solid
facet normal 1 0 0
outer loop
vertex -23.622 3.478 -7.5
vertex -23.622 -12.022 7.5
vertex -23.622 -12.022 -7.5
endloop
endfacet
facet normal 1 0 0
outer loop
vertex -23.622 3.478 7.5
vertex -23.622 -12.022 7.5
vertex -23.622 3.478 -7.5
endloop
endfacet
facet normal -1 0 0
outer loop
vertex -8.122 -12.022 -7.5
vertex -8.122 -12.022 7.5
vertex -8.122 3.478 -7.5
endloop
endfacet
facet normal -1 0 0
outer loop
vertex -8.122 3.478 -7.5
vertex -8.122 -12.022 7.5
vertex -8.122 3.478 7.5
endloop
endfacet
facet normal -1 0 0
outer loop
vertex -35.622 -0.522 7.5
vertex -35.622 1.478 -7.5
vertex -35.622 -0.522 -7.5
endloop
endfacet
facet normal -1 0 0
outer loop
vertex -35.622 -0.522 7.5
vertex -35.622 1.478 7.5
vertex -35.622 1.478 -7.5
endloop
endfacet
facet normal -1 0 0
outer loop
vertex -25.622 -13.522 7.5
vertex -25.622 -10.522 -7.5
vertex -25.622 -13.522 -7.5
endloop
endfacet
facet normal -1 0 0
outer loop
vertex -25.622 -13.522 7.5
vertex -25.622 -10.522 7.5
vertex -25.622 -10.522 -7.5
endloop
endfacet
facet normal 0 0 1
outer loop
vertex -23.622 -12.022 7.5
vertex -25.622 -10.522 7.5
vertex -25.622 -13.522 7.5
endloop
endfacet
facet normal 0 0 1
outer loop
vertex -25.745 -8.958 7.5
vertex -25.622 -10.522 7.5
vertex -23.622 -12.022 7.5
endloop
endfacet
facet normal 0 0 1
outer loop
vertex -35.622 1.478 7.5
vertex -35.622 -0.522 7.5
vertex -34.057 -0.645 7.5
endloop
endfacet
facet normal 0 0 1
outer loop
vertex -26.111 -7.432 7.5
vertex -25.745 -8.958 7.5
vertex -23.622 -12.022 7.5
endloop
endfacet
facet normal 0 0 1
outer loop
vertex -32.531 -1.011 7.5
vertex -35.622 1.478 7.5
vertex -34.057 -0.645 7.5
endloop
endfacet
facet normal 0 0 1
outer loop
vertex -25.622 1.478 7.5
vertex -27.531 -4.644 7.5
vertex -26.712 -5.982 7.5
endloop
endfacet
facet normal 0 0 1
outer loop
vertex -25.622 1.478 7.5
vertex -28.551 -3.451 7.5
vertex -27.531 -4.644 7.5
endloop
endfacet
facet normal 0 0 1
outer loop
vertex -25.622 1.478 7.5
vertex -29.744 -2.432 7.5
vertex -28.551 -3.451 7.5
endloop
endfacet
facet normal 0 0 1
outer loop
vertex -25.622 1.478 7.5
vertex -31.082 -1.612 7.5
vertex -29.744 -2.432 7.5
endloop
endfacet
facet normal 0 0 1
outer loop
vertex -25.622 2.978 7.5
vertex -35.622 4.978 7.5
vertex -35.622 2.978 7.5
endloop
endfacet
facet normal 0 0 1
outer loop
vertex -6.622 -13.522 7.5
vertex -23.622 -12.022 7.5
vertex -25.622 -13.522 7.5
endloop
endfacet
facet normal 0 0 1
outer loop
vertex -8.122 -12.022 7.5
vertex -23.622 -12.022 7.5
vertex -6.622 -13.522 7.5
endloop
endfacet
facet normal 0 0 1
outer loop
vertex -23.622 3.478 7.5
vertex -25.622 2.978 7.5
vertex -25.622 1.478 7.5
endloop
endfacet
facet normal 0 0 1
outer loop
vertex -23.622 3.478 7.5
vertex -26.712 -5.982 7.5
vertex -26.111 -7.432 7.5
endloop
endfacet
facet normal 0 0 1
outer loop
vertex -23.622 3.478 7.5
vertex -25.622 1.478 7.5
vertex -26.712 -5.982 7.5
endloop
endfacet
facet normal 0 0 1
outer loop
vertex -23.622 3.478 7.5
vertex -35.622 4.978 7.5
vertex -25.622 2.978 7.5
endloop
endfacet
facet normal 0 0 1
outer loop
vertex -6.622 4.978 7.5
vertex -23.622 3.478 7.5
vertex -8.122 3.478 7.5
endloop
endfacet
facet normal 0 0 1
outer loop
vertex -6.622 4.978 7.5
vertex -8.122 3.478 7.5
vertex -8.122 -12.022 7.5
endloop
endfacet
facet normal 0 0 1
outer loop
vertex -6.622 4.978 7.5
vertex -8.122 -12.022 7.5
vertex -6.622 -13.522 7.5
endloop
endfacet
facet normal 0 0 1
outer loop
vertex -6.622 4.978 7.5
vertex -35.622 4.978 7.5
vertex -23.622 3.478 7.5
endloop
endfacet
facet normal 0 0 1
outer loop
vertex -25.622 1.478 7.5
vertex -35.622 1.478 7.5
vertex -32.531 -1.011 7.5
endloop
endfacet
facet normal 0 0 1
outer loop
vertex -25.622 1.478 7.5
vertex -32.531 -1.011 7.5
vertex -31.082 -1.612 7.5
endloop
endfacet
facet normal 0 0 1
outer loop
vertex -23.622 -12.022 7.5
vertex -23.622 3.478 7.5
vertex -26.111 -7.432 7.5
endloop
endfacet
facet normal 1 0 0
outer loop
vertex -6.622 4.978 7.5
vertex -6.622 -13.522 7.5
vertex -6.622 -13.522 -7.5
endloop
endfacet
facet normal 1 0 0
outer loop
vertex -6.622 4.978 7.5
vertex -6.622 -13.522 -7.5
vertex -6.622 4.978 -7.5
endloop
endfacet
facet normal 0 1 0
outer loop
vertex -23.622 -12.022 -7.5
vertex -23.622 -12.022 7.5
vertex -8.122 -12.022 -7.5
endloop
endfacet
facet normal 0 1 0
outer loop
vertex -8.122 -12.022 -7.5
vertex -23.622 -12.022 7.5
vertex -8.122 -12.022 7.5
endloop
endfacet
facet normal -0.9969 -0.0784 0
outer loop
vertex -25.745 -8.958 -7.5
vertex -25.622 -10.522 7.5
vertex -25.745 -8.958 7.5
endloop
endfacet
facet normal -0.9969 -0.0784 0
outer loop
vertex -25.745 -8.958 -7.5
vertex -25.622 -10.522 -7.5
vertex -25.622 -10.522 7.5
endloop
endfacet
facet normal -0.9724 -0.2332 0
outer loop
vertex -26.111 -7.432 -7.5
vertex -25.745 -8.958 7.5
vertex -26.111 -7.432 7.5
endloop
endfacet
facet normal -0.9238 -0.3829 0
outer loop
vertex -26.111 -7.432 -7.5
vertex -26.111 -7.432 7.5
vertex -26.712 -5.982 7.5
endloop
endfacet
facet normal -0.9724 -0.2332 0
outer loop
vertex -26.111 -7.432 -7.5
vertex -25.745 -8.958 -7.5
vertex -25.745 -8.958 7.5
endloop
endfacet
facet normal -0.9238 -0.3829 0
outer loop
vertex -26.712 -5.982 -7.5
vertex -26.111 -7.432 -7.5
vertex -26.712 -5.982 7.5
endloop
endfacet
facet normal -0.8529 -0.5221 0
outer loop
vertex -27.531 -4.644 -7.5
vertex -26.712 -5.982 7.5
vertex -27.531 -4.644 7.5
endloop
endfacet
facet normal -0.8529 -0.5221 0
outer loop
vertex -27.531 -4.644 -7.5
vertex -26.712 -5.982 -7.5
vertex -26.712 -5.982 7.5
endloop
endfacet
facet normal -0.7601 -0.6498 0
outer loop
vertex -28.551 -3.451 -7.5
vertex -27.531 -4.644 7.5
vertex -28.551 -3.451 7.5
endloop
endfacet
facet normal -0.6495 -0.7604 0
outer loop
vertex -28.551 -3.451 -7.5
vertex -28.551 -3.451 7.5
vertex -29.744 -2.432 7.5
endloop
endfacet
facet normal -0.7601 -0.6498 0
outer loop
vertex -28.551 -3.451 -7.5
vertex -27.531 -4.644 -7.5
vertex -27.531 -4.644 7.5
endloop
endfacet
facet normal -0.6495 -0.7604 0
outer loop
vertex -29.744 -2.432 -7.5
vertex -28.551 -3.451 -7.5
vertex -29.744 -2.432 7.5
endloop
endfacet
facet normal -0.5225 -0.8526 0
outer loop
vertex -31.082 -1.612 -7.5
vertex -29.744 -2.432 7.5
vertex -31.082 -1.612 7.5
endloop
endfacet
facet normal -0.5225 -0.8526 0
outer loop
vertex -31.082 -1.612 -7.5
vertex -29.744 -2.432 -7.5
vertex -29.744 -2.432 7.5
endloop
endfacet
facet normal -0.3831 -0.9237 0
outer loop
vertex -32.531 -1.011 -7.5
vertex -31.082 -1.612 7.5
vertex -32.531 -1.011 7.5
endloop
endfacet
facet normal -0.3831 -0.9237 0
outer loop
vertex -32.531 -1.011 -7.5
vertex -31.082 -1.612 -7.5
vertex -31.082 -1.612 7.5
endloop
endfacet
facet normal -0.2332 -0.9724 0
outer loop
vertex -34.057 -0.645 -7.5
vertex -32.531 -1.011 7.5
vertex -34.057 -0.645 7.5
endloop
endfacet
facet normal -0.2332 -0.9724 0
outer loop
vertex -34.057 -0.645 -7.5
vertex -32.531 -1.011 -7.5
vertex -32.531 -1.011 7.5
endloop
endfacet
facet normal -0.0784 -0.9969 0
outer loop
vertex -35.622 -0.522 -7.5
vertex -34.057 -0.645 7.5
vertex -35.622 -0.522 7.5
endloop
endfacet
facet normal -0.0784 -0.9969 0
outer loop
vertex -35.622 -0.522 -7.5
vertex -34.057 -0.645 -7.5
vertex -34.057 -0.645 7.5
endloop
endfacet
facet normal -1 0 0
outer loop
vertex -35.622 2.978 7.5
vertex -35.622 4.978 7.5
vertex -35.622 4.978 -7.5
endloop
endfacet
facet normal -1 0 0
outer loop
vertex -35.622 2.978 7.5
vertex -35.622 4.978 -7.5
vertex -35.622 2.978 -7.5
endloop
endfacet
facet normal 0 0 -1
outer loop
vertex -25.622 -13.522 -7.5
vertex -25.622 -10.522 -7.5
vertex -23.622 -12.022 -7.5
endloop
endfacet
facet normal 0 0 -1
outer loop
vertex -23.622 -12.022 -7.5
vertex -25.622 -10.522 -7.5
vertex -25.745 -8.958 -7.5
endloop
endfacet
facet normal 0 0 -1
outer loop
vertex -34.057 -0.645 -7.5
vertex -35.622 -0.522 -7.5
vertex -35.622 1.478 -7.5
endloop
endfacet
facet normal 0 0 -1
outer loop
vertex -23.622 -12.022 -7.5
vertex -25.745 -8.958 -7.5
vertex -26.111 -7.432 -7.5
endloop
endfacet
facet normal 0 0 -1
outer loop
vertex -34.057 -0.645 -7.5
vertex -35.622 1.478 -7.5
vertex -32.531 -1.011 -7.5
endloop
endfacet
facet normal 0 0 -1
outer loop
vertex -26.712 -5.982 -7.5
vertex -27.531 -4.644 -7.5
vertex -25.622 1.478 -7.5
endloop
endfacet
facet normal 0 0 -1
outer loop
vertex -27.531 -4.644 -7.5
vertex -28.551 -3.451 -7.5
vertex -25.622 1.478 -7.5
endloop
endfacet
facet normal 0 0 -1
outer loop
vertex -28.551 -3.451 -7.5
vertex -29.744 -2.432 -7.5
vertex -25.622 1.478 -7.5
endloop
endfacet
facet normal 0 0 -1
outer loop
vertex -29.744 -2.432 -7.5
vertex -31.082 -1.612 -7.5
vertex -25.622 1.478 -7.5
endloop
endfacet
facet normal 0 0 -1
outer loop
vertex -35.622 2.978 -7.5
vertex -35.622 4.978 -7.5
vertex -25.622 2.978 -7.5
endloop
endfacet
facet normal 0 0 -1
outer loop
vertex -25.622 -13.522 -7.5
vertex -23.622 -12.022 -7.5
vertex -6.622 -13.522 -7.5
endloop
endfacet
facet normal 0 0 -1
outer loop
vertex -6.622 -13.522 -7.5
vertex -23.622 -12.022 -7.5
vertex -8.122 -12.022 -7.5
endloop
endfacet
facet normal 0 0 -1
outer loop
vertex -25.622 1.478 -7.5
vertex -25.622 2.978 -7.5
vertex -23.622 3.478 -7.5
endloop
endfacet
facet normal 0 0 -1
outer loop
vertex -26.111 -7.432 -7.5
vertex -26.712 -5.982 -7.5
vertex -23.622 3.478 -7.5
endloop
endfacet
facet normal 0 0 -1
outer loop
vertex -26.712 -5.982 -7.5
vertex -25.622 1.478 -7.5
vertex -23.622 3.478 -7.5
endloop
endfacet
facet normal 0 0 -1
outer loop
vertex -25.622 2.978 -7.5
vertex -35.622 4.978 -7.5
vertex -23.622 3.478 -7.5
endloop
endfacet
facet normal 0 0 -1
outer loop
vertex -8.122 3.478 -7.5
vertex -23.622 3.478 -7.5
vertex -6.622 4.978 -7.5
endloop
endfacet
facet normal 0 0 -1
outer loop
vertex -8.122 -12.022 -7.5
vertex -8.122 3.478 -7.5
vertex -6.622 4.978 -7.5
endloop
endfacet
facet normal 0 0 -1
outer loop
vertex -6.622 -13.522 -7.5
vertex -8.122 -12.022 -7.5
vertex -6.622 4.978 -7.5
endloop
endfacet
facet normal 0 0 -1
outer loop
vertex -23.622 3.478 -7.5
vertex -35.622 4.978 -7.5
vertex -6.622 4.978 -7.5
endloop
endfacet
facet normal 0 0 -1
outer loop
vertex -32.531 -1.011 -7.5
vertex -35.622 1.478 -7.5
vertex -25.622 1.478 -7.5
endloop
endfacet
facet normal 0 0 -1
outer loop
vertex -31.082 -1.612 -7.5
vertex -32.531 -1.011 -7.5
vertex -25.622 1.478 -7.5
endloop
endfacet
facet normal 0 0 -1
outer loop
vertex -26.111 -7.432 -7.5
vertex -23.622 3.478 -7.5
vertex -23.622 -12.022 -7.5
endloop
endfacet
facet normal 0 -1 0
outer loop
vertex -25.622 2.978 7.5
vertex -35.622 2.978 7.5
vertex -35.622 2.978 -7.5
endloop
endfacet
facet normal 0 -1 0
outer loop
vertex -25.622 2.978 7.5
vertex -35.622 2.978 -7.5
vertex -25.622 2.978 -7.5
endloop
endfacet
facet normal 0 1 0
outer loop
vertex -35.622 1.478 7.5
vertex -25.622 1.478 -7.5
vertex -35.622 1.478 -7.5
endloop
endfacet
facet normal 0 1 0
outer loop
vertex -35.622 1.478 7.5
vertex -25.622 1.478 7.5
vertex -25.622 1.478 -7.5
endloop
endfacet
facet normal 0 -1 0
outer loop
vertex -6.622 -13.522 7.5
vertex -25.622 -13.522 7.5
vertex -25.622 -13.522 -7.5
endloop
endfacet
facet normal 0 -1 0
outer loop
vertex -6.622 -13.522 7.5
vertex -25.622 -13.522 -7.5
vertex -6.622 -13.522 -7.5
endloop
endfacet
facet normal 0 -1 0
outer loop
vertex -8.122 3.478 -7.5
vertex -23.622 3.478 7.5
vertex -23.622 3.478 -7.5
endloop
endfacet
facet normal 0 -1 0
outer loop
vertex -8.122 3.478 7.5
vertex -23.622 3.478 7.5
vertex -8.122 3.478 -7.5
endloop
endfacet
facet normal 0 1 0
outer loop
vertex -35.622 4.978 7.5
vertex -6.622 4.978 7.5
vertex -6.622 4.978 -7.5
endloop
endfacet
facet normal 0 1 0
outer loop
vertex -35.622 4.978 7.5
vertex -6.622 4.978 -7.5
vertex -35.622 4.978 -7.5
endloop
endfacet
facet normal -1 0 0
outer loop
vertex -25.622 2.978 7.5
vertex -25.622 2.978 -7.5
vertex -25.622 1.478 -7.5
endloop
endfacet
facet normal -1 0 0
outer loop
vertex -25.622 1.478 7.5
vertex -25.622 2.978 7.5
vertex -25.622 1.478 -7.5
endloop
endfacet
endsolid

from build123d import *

# Parameters (mm, degrees)
F0_W     = 15.5
F0_H     = 15.5
F1_DEPTH = 7.5
F2_R     = 9.99999


# Not quite as in the source:
# - a fillet or chamfer is up to 0.001 mm smaller than in the source, because OpenCascade refuses the exact size
# - a feature names something its author has since deleted; it is built from what else it names


with BuildPart() as f1:
    # F0 (on Top) → F1 (new body, symmetric)
    with BuildSketch(Plane.XY):
        Polygon((-25.621605996, -0.5219928448), (-25.621605996, -7.0219928448), (-25.621605996, -13.5219928448), (-6.621605996, -13.5219928448), (-6.621605996, -8.299067306), (-6.621605996, 4.9780071552), (-35.621605996, 4.9780071552), (-35.621605996, 2.9780071552), (-25.621605996, 2.9780071552), (-25.621605996, 1.4780071552), (-35.621605996, 1.4780071552), (-35.621605996, -0.5219928448), align=None)
        with Locations((-15.871605996, -4.2719928448)):
            Rectangle(F0_W, F0_H, mode=Mode.SUBTRACT)
    extrude(amount=F1_DEPTH, both=True)

    # F2 (radius 10 in the source; OpenCascade refuses exactly that, so slightly less here)
    f2_edges = [f1.edges().sort_by_distance(p)[0] for p in [
        (-25.621606, -0.521993, 0),
    ]]
    fillet(f2_edges, radius=F2_R)


solid = f1.part
